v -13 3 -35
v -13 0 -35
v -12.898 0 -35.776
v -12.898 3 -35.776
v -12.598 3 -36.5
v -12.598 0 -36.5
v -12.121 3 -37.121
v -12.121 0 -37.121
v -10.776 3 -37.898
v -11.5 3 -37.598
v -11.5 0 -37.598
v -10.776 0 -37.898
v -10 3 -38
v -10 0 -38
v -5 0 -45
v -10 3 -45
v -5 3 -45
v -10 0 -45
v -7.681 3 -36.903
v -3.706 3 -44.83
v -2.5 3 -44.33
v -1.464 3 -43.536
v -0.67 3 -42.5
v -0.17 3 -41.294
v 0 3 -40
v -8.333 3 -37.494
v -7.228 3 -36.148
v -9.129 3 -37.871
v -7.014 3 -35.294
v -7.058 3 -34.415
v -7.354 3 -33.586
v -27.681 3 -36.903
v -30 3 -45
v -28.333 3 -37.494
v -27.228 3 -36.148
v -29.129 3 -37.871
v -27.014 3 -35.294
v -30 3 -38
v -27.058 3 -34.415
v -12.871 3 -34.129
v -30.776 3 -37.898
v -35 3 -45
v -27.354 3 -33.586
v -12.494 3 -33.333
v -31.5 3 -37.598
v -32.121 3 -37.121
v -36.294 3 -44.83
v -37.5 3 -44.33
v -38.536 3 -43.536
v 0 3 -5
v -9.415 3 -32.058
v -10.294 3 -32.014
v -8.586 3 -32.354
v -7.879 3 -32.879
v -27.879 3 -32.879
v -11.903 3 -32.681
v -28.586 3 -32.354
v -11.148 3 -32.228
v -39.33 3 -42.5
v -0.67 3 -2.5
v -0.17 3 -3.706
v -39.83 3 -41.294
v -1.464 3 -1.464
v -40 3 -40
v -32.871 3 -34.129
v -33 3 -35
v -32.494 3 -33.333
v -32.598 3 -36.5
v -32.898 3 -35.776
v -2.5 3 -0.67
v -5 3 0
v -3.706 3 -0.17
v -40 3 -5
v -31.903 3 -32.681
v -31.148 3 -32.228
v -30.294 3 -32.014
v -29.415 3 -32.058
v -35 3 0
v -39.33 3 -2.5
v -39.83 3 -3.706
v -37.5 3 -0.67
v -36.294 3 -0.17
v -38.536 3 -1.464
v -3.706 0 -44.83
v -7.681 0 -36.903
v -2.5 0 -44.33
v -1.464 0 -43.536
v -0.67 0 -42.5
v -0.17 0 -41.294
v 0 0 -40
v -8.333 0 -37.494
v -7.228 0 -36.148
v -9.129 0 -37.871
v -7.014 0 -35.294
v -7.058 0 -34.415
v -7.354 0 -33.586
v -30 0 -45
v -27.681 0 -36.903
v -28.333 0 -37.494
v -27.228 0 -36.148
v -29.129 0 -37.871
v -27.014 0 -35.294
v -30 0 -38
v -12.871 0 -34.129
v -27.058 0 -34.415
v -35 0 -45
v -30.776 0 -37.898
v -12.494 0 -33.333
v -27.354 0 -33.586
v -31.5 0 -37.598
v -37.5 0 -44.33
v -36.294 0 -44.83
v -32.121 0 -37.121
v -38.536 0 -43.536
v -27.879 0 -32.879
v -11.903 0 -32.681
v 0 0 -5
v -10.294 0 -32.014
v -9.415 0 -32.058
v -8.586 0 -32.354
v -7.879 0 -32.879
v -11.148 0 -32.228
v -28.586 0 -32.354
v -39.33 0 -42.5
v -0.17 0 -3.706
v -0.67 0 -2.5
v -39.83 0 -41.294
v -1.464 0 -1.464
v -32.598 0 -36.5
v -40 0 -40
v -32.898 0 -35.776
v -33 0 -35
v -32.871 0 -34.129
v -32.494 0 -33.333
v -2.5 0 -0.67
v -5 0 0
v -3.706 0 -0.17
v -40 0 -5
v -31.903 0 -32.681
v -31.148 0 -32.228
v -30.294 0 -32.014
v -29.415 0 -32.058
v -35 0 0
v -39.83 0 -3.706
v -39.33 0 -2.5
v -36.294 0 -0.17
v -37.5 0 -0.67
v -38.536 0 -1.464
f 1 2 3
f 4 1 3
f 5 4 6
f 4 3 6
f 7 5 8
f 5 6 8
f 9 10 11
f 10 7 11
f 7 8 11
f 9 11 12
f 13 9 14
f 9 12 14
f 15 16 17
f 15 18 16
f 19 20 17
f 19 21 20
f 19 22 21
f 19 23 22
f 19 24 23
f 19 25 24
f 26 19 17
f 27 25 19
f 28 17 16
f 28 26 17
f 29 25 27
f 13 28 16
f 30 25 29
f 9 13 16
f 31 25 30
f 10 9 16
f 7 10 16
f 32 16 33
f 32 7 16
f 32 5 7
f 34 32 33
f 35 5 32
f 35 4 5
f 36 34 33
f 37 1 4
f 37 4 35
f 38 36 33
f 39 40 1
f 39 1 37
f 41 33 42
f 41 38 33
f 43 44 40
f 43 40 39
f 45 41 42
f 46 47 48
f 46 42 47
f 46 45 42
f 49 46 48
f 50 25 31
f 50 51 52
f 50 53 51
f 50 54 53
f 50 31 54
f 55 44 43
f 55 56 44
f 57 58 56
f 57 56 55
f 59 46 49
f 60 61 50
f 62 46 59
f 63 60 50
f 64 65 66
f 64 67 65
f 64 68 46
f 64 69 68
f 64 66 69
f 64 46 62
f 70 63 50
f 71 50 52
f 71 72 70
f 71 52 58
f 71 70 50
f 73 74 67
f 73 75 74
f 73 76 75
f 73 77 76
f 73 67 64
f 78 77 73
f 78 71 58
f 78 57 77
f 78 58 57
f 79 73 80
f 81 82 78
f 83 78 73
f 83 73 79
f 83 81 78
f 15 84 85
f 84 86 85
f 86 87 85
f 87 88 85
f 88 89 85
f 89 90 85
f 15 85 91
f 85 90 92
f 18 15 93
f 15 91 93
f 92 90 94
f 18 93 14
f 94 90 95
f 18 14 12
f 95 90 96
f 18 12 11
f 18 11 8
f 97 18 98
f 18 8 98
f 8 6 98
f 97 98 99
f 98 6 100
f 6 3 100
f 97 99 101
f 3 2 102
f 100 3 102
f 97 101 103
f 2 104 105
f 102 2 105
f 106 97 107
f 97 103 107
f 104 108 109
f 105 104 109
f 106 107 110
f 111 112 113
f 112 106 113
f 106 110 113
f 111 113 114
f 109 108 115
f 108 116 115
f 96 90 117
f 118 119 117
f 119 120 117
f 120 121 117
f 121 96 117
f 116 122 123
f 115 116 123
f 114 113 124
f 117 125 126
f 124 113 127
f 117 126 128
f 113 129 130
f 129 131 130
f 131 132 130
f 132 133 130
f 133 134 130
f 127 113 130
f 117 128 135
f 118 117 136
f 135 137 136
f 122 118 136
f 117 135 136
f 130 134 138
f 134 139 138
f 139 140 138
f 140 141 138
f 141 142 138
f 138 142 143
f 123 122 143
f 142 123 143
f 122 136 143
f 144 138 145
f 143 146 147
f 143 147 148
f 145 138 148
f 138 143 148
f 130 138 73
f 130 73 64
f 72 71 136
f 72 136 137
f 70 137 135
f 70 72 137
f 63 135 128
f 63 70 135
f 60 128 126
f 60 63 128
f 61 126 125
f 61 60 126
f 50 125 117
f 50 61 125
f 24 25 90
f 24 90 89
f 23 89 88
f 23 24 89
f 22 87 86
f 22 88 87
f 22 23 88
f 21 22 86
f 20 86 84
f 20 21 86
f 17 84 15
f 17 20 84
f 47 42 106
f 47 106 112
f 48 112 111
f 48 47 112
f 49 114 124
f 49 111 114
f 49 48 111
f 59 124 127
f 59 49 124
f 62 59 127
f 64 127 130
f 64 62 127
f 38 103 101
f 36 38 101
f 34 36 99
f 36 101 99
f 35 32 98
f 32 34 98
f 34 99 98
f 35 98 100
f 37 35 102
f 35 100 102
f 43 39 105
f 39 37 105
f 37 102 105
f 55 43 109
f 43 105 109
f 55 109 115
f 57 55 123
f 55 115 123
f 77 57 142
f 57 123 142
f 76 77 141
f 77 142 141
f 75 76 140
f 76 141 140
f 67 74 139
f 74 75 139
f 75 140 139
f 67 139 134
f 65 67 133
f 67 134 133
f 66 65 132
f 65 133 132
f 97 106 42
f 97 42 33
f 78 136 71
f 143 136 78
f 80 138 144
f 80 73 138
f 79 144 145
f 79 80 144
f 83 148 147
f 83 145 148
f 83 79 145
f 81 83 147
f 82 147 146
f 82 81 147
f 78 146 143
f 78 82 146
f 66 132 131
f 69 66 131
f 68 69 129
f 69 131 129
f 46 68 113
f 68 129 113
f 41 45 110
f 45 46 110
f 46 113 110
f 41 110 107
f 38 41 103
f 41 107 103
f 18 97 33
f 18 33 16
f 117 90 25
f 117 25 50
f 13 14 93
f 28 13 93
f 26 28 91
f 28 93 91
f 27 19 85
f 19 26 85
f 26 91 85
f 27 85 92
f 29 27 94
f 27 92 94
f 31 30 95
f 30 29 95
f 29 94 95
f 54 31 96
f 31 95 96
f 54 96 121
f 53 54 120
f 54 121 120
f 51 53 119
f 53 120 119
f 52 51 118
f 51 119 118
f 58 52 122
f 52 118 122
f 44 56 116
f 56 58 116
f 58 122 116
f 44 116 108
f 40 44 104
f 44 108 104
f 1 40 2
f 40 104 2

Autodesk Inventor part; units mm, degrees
ref_plane "YZ Plane" through (0, 0, 0) normal (1, 0, 0) x (0, 1, 0)
ref_plane "XZ Plane" through (0, 0, 0) normal (0, 1, 0) x (-1, 0, 0)
ref_plane "XY Plane" through (0, 0, 0) normal (0, 0, 1) x (1, 0, 0)
sketch "Sketch20" plane through (0, 0, 0) normal (0, 1, 0) x (-1, 0, 0)
  line L0 (0, 0) -> (40, 0)
  line L1 (40, 0) -> (40, -45)
  line L2 (40, -45) -> (0, -45)
  line L3 (0, -45) -> (0, 0)
  line L4 (40, -45) -> (30, -45)
  line L5 (30, -45) -> (30, -35)
  line L6 (0, -45) -> (10, -45)
  line L7 (10, -45) -> (10, -35)
  circle A0 centre (30, -35) radius 3
  circle A1 centre (10, -35) radius 3
  dimension "d117" = 40
  dimension "d118" = 45
  dimension "d119" = 10
  dimension "d120" = 10
  dimension "d121" = 10
  dimension "d122" = 10
  dimension "d123" = 6
  dimension "d124" = 6
extrude "Extrusion20" add sketch "Sketch20" along normal blind 3
fillet "Fillet6" radius 5 4 edges at (0, 1.5, 0) (-40, 1.5, 0) (0, 1.5, -45) (-40, 1.5, -45)
properties part number "MagnetHolder_Special"
